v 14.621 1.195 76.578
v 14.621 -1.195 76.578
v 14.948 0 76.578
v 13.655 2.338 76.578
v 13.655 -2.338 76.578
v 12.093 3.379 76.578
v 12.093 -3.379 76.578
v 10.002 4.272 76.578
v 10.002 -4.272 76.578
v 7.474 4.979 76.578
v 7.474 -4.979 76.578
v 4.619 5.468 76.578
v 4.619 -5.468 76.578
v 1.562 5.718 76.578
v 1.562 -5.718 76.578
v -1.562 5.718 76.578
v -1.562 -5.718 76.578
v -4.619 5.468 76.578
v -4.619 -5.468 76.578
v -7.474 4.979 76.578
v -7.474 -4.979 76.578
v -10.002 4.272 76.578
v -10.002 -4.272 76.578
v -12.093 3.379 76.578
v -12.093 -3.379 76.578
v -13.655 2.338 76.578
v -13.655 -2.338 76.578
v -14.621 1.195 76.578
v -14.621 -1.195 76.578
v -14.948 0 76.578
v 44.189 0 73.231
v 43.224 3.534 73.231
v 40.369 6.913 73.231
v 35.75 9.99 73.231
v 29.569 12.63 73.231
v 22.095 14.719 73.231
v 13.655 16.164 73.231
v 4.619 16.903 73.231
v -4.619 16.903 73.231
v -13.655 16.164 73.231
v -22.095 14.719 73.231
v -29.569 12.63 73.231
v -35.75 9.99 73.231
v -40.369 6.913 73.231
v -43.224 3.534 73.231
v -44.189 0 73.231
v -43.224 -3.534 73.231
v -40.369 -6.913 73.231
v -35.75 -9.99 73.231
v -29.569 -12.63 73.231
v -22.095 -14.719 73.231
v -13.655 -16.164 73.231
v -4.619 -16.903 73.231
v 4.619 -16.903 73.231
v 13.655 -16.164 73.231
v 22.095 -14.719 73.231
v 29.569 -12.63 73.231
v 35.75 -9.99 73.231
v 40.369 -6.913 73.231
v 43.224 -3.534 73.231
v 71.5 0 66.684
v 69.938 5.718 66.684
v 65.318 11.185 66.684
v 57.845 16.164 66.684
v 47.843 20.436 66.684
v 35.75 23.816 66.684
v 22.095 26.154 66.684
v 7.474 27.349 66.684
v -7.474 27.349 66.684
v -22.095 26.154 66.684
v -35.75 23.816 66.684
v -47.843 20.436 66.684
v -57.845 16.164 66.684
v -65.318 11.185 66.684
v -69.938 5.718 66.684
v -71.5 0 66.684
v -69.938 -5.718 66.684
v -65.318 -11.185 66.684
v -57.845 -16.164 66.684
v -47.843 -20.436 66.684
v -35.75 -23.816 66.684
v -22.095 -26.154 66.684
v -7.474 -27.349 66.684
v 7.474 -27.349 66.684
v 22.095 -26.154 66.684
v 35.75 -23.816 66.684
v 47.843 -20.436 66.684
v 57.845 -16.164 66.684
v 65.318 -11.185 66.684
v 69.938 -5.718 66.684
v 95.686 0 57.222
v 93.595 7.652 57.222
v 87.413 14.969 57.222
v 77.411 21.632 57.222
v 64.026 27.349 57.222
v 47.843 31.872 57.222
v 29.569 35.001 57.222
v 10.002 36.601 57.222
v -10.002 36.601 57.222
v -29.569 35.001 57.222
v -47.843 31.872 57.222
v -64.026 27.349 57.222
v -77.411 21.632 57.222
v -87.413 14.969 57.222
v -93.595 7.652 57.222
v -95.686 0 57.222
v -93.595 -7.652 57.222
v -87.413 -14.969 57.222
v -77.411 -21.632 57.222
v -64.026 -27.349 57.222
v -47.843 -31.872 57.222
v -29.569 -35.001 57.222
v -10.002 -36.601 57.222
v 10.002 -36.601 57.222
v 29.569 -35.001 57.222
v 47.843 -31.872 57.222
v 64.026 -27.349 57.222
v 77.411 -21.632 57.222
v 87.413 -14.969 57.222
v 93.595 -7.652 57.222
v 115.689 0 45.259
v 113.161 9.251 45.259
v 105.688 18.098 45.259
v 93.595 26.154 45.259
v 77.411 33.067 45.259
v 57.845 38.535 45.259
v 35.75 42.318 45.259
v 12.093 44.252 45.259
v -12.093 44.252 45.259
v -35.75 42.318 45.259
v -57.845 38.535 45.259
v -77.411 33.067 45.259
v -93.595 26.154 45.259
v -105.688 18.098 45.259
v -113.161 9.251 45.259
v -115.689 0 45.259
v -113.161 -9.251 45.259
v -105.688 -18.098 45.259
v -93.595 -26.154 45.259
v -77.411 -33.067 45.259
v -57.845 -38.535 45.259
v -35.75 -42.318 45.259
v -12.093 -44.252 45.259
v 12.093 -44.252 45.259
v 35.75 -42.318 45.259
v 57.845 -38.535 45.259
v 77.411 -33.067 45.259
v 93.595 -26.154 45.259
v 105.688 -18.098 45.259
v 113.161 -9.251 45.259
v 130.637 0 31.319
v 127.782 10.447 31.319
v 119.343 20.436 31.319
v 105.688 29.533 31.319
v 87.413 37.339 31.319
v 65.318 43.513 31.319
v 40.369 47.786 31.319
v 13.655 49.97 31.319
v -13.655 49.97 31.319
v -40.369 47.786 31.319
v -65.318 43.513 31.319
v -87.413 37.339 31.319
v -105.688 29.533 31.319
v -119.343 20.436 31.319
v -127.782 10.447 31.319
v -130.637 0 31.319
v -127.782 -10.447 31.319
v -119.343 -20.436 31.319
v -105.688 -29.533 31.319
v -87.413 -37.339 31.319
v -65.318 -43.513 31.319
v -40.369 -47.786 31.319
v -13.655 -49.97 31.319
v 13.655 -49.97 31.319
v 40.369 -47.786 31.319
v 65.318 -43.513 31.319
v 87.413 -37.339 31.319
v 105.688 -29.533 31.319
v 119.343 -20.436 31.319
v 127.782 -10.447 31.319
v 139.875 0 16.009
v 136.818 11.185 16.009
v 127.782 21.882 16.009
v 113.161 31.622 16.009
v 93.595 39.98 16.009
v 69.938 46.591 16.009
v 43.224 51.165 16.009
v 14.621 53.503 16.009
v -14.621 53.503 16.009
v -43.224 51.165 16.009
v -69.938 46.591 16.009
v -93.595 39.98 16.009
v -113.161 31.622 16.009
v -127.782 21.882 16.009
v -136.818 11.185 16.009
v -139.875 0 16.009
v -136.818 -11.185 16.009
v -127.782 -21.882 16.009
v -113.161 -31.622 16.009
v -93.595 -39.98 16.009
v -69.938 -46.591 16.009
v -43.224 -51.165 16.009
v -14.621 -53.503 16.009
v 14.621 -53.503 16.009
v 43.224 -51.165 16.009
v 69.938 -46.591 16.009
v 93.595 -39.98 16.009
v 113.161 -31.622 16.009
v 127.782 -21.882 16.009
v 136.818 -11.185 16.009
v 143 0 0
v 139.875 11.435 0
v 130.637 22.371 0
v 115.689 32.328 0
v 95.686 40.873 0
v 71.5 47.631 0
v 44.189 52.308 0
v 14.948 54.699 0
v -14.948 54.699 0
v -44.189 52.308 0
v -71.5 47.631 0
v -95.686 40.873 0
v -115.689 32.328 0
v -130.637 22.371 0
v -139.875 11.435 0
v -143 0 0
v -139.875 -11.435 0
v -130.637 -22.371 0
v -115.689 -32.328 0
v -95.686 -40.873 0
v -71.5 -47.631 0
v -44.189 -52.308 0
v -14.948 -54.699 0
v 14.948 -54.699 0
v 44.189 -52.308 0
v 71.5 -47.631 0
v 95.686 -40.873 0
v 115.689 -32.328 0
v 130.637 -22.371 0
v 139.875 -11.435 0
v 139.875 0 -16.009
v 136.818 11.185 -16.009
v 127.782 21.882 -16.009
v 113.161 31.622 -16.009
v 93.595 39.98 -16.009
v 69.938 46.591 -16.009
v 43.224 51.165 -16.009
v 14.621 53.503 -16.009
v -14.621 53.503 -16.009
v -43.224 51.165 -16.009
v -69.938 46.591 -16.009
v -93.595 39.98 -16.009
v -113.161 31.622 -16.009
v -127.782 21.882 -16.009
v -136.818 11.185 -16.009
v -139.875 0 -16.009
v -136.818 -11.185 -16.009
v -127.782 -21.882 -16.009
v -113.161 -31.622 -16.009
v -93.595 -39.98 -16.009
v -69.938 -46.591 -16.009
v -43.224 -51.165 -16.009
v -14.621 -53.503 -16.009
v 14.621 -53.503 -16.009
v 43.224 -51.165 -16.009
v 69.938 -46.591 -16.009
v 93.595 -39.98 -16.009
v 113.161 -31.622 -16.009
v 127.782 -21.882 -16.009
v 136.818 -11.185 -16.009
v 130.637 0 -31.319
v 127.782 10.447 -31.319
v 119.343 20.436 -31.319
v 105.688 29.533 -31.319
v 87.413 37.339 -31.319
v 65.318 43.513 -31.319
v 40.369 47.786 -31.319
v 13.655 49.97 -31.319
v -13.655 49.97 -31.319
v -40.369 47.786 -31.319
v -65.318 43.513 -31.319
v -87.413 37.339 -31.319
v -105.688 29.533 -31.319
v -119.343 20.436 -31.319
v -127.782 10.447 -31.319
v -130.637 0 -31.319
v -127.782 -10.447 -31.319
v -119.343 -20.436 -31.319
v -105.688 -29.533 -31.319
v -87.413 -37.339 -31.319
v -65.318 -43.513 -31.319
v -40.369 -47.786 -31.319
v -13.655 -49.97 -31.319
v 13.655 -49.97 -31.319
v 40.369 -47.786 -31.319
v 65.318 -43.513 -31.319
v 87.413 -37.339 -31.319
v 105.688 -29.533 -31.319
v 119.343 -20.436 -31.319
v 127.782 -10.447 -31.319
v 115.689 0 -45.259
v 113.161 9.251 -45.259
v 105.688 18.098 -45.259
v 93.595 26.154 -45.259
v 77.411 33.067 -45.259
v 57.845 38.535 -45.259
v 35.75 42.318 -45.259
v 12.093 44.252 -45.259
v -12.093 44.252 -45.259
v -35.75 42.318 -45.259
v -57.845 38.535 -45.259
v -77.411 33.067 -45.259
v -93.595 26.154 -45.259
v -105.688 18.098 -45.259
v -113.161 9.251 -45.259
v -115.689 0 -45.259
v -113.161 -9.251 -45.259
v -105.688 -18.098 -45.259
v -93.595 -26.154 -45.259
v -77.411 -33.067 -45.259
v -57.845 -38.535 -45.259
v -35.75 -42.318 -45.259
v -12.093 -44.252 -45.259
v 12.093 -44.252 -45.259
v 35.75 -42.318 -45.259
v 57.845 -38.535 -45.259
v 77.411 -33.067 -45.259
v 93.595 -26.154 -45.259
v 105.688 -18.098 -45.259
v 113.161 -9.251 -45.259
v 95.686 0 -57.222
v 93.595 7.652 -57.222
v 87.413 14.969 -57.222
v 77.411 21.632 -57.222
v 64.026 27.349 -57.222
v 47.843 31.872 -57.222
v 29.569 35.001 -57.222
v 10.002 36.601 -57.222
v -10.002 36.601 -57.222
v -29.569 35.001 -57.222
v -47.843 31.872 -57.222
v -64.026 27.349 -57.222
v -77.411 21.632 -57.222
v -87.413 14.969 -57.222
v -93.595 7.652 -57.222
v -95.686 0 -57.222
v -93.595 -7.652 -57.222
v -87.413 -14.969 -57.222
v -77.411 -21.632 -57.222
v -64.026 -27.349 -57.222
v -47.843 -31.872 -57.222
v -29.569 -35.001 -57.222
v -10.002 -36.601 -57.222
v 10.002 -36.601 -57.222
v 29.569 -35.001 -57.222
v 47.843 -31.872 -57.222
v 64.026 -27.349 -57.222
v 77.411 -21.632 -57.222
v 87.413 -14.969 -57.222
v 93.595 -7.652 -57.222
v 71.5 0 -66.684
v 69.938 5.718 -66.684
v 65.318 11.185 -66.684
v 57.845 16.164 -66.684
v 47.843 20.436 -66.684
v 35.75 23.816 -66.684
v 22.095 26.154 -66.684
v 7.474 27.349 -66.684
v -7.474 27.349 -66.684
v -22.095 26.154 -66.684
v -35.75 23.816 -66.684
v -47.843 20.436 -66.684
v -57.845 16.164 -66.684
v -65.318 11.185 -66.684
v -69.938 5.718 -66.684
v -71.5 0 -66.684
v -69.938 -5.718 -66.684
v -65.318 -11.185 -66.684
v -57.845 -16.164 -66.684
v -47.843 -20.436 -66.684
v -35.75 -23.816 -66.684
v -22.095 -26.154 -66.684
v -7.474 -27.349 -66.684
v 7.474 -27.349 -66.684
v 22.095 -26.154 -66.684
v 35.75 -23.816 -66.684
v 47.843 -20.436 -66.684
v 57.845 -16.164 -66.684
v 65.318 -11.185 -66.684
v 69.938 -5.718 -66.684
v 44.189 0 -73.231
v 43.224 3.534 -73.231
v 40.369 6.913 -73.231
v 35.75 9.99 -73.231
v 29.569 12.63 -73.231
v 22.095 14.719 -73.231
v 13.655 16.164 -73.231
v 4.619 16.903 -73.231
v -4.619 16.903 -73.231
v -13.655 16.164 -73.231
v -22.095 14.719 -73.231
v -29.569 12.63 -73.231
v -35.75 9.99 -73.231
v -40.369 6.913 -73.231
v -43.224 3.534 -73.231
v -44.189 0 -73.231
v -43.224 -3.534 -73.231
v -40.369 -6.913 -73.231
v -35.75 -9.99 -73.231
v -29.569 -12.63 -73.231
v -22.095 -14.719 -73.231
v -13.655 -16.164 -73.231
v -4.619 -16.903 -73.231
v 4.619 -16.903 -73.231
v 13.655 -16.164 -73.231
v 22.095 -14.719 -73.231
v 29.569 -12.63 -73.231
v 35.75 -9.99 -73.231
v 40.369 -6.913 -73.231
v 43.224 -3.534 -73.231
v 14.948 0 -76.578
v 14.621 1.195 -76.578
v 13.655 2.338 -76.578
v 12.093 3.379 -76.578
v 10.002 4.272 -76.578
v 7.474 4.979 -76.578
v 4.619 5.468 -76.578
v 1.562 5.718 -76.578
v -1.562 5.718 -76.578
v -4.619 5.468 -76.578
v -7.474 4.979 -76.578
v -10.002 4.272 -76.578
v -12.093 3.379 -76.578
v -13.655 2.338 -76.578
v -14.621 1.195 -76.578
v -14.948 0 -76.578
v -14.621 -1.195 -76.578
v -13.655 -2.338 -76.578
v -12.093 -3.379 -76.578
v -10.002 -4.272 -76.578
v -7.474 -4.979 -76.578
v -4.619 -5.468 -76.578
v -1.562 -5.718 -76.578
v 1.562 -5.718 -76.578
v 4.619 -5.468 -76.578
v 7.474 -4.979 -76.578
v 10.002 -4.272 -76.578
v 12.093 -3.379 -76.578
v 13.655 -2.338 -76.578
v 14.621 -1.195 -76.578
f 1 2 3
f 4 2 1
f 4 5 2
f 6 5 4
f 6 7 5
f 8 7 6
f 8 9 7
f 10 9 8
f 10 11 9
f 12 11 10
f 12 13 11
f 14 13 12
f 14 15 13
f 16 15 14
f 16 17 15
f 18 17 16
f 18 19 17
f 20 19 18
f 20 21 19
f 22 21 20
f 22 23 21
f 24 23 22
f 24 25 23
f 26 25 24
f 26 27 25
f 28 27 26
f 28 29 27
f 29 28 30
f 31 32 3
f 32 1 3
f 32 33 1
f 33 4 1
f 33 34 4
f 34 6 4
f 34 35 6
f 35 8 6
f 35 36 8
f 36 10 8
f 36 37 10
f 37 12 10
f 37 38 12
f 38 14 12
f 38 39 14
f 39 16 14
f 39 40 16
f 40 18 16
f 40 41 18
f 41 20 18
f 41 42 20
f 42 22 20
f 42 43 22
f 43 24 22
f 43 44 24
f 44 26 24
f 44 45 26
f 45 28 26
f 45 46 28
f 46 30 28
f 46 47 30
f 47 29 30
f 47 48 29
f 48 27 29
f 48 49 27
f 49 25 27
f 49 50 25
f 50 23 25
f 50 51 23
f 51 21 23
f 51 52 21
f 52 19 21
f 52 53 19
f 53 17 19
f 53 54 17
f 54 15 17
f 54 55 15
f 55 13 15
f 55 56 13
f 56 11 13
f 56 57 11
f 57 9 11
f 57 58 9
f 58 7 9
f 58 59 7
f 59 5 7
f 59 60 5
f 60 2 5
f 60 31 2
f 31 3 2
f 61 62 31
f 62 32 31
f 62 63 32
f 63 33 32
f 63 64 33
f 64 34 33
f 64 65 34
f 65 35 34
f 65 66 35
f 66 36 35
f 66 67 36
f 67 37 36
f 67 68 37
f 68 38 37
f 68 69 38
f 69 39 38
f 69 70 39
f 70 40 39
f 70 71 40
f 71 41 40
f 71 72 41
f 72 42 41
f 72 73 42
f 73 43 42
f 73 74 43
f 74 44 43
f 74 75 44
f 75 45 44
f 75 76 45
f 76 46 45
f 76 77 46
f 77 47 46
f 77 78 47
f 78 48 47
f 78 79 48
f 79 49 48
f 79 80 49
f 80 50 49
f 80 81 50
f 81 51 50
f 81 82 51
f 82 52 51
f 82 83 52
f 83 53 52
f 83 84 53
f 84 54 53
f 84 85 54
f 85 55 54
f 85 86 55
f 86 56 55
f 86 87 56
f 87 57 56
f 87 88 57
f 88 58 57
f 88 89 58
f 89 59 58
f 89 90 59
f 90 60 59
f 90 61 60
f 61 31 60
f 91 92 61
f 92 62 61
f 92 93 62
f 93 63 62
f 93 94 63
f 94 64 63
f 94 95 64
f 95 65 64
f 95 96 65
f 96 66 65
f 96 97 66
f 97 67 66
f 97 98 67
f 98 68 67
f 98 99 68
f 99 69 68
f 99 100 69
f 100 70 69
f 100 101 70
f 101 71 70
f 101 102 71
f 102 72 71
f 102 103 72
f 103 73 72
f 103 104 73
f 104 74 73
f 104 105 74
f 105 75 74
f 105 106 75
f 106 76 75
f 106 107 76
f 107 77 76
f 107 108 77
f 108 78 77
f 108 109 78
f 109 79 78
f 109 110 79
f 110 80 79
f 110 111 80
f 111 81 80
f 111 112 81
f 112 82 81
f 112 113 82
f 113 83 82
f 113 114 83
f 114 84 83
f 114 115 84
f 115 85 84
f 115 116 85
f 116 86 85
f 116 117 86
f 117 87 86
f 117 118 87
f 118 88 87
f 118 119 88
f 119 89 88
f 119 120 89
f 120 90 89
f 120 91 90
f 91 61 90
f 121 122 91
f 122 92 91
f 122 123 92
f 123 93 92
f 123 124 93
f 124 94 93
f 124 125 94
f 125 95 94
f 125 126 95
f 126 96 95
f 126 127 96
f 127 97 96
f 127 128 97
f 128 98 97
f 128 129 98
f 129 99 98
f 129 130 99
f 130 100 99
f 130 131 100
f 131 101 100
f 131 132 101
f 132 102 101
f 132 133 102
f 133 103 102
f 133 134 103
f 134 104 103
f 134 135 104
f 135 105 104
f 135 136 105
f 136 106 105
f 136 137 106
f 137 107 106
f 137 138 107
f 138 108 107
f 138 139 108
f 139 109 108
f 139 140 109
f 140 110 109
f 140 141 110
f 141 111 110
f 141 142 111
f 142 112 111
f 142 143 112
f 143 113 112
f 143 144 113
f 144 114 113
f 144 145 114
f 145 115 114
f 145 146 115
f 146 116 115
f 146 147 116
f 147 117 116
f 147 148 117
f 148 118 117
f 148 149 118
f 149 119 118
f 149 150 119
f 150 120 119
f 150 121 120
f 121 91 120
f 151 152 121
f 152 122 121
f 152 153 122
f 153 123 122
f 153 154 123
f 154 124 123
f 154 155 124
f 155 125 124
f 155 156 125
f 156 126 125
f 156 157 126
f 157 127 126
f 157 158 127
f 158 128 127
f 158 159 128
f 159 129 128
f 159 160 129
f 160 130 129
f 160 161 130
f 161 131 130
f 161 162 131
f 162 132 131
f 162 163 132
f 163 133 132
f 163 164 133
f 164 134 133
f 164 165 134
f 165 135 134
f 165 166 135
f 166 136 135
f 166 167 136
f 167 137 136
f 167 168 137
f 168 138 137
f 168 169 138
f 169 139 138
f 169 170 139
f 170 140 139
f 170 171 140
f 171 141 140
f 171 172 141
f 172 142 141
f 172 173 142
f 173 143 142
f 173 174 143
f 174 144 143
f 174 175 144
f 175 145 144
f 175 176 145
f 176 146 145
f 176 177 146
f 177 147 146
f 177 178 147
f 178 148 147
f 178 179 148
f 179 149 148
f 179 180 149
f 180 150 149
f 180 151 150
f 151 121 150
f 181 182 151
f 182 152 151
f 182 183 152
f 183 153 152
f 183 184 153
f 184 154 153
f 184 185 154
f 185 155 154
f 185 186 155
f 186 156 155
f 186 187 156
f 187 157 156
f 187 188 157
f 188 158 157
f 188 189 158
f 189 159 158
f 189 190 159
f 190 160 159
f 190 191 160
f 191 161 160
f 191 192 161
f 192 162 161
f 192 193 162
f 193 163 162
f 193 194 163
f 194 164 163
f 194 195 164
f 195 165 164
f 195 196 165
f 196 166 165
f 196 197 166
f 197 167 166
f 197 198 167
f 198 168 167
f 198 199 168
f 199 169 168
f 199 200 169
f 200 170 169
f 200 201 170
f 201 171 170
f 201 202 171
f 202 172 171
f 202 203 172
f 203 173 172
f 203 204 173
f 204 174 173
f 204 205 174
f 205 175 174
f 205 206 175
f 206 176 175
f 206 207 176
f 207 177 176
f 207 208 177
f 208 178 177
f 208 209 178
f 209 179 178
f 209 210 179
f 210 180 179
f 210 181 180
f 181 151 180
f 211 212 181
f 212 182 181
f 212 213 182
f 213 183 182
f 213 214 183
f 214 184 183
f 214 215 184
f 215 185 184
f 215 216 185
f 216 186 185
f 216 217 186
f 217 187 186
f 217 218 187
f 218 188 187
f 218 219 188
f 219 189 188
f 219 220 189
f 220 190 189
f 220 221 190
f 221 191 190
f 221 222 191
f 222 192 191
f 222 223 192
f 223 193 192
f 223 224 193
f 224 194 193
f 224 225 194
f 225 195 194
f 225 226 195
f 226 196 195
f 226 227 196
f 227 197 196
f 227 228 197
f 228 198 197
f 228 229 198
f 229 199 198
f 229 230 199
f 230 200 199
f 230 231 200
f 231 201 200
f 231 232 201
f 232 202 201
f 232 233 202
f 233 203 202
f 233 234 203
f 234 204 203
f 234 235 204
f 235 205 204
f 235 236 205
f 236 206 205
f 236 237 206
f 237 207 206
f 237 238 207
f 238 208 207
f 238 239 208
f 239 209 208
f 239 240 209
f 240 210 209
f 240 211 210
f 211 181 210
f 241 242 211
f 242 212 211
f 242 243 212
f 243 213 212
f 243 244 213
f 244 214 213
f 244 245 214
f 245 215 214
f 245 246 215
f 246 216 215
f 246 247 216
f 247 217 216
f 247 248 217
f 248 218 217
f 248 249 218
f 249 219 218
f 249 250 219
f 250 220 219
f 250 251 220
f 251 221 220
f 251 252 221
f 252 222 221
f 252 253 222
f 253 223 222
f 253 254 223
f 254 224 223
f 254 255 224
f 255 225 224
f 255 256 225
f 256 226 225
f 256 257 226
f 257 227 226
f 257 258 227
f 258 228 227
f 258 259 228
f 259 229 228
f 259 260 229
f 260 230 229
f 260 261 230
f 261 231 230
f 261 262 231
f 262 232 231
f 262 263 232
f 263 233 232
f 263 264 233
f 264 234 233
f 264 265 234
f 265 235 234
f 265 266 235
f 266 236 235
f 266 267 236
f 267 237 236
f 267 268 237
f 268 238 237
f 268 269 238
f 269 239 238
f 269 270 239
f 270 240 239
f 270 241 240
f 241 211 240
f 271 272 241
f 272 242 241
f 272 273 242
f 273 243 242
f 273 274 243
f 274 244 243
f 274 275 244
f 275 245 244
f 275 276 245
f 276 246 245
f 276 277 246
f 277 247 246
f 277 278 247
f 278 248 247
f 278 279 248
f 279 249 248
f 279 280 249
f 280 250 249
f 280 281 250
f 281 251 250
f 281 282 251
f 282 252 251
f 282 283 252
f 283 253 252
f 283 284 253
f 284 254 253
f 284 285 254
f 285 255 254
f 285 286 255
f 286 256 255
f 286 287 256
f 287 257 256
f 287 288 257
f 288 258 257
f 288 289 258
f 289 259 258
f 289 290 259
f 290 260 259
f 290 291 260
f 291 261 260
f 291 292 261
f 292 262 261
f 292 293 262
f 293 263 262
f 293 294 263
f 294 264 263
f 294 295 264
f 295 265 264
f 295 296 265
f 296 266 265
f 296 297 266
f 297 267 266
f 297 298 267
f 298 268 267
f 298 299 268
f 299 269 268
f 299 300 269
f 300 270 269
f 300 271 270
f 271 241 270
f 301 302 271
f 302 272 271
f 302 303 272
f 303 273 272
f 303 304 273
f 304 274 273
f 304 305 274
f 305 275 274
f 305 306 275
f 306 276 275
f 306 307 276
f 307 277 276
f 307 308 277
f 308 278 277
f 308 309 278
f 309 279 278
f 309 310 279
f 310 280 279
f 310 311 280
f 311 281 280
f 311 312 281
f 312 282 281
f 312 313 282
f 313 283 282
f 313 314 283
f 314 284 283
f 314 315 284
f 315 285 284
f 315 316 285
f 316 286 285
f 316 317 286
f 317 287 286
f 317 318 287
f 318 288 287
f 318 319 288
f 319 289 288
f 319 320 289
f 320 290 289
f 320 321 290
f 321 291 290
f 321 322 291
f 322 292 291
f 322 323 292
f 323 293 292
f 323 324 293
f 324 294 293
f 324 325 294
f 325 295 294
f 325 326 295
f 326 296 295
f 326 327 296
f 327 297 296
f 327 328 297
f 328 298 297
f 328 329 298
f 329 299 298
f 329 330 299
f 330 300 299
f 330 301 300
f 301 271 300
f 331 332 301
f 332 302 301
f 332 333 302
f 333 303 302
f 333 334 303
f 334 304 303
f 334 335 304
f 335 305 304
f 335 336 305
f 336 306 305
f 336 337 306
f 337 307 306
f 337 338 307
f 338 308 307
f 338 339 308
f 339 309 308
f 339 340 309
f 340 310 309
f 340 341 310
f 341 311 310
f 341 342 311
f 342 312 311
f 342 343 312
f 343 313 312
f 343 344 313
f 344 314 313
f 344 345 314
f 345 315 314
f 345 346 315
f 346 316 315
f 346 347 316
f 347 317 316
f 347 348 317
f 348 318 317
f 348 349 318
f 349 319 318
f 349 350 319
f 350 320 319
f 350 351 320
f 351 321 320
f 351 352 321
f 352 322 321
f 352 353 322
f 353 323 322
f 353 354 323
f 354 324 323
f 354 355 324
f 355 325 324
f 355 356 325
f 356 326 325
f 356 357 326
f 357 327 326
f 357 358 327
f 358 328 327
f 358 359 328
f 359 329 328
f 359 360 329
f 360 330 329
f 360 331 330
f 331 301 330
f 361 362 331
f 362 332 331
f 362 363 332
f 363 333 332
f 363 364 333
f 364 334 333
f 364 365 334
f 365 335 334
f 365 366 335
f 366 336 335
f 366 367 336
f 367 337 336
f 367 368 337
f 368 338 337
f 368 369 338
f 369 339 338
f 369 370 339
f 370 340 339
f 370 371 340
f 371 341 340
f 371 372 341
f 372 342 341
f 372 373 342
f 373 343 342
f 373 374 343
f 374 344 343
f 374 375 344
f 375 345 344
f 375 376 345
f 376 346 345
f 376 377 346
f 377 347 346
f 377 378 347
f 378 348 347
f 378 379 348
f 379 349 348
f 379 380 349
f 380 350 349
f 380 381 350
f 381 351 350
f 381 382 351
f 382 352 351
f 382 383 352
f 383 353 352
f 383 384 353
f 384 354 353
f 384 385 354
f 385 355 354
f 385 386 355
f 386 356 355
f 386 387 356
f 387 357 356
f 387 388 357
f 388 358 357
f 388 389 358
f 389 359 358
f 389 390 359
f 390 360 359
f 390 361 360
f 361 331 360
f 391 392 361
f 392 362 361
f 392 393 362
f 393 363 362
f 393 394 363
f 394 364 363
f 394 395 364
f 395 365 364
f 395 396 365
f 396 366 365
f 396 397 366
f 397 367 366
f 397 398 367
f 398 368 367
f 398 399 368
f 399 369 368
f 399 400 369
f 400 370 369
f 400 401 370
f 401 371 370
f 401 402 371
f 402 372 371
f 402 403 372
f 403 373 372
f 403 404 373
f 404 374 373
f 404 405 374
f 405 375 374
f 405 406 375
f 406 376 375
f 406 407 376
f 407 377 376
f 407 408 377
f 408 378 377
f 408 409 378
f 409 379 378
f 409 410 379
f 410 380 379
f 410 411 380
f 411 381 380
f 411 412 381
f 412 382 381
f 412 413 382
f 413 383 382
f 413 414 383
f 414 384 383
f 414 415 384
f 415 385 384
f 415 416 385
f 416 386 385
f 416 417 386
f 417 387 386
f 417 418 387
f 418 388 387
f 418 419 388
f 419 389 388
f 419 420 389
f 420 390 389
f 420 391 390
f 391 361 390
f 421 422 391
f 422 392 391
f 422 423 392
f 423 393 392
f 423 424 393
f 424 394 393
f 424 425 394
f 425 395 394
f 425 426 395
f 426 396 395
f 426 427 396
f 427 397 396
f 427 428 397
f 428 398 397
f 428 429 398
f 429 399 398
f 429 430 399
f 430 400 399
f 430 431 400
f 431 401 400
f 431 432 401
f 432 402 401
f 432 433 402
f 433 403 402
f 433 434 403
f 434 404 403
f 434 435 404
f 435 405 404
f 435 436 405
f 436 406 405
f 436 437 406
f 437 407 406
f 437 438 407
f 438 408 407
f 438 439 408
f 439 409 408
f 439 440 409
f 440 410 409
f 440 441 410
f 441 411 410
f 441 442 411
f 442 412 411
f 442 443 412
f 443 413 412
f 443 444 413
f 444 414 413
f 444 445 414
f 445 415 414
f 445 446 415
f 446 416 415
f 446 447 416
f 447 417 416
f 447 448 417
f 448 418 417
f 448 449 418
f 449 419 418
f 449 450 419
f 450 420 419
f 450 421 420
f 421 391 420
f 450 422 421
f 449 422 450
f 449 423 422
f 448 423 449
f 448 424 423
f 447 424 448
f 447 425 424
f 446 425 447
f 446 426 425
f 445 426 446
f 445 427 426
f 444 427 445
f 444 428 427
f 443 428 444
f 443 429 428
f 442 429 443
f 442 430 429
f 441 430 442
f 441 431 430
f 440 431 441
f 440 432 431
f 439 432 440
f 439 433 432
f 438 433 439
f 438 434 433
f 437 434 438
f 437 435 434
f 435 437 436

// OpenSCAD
// Generated by SolidPython 1.0.1 on 2020-07-29 00:46:50


scale(v = [13, 5, 7]) {
	sphere(r = 11);
}
/***********************************************
*********      SolidPython code:      **********
************************************************
 
# import packages: SolidPython
from solid import *
from solid.utils import *
from itertools import chain, combinations, permutations


class Resize:

    def __init__(self, scad_file):
        self.scad_file = scad_file
        #self.scad_file = import_scad(scad_file)
        # cone/cylinder param:
        self.r1 = 0
        self.r2 = 0
        self.h = 0
        # rectangular prism param:
        self.w = 0
        self.l = 0
        # ellipse param:
        self.r = 0

    # import OpenScad code (file name corresponds to shape)


    # classify shape + parameters
    def assign(self, param1, param2, param3):
        if self.scad_file == 'cone.scad':
            self.r1 = param1
            self.r2 = param2
            self.h = param3
        elif self.scad_file == 'cylinder.scad':
            self.r1 = param1
            self.r2 = param2
            self.h = param3
        elif self.scad_file == 'rectangularPrism.scad':
            self.h = param1
            self.l = param2
            self.w = param3
        else:
            self.r = param1
            self.h = param2

    # resize parameters
    def iterate(self):
        x = range(3, 20, 2)
        i = 1
        if self.scad_file == 'cone.scad':
            tempList = list(permutations(x, 2))
            for temp in tempList:
                param1 = temp[0]
                param2 = temp[1]
                filepath = 'produced_scad_files/' + 'cone' + str(param1) + '_' + str(param2) + '_' + '.scad'
                scad_render_to_file(cylinder(h=param1, r1=param2, r2=0), filepath)

        elif self.scad_file == 'cylinder.scad':
            tempList = list(permutations(x, 3))
            for temp in tempList:
                param1 = temp[0]
                param2 = temp[1]
                filepath = 'produced_scad_files/' + 'cylinder' + str(param1) + '_' + str(param2) + '_' + '.scad'
                scad_render_to_file(cylinder(h=param1, r1=param2, r2=param2), filepath)

        elif self.scad_file == 'rectangularPrism.scad':
            tempList = list(permutations(x, 3))
            for temp in tempList:
                param1 = temp[0]
                param2 = temp[1]
                param3 = temp[2]
                filepath = 'produced_scad_files/' + 'rectangularPrism' + str(param1) + '_' + str(param2) + '_' + str(
                    param3) + '.scad'
                scad_render_to_file(cube(size=(param1, param2, param3)), filepath)

        elif self.scad_file == 'ellipse.scad':
            tempList = list(permutations(x, 4))
            for temp in tempList:
                param1 = temp[0]
                param2 = temp[1]
                param3 = temp[2]
                param4 = temp[3]
                filepath = 'produced_scad_files/' + 'ellipse' + str(param1) + '_' + str(param2) + '_' + str(param3) + '_' + str(param4) + '.scad'
                scad_render_to_file(scale([param1, param2, param3])(sphere(r=param4)), filepath)

    def render_to_scadfile(self):
        scad_render_to_file(scad, 'example.scad') 
 
************************************************/
